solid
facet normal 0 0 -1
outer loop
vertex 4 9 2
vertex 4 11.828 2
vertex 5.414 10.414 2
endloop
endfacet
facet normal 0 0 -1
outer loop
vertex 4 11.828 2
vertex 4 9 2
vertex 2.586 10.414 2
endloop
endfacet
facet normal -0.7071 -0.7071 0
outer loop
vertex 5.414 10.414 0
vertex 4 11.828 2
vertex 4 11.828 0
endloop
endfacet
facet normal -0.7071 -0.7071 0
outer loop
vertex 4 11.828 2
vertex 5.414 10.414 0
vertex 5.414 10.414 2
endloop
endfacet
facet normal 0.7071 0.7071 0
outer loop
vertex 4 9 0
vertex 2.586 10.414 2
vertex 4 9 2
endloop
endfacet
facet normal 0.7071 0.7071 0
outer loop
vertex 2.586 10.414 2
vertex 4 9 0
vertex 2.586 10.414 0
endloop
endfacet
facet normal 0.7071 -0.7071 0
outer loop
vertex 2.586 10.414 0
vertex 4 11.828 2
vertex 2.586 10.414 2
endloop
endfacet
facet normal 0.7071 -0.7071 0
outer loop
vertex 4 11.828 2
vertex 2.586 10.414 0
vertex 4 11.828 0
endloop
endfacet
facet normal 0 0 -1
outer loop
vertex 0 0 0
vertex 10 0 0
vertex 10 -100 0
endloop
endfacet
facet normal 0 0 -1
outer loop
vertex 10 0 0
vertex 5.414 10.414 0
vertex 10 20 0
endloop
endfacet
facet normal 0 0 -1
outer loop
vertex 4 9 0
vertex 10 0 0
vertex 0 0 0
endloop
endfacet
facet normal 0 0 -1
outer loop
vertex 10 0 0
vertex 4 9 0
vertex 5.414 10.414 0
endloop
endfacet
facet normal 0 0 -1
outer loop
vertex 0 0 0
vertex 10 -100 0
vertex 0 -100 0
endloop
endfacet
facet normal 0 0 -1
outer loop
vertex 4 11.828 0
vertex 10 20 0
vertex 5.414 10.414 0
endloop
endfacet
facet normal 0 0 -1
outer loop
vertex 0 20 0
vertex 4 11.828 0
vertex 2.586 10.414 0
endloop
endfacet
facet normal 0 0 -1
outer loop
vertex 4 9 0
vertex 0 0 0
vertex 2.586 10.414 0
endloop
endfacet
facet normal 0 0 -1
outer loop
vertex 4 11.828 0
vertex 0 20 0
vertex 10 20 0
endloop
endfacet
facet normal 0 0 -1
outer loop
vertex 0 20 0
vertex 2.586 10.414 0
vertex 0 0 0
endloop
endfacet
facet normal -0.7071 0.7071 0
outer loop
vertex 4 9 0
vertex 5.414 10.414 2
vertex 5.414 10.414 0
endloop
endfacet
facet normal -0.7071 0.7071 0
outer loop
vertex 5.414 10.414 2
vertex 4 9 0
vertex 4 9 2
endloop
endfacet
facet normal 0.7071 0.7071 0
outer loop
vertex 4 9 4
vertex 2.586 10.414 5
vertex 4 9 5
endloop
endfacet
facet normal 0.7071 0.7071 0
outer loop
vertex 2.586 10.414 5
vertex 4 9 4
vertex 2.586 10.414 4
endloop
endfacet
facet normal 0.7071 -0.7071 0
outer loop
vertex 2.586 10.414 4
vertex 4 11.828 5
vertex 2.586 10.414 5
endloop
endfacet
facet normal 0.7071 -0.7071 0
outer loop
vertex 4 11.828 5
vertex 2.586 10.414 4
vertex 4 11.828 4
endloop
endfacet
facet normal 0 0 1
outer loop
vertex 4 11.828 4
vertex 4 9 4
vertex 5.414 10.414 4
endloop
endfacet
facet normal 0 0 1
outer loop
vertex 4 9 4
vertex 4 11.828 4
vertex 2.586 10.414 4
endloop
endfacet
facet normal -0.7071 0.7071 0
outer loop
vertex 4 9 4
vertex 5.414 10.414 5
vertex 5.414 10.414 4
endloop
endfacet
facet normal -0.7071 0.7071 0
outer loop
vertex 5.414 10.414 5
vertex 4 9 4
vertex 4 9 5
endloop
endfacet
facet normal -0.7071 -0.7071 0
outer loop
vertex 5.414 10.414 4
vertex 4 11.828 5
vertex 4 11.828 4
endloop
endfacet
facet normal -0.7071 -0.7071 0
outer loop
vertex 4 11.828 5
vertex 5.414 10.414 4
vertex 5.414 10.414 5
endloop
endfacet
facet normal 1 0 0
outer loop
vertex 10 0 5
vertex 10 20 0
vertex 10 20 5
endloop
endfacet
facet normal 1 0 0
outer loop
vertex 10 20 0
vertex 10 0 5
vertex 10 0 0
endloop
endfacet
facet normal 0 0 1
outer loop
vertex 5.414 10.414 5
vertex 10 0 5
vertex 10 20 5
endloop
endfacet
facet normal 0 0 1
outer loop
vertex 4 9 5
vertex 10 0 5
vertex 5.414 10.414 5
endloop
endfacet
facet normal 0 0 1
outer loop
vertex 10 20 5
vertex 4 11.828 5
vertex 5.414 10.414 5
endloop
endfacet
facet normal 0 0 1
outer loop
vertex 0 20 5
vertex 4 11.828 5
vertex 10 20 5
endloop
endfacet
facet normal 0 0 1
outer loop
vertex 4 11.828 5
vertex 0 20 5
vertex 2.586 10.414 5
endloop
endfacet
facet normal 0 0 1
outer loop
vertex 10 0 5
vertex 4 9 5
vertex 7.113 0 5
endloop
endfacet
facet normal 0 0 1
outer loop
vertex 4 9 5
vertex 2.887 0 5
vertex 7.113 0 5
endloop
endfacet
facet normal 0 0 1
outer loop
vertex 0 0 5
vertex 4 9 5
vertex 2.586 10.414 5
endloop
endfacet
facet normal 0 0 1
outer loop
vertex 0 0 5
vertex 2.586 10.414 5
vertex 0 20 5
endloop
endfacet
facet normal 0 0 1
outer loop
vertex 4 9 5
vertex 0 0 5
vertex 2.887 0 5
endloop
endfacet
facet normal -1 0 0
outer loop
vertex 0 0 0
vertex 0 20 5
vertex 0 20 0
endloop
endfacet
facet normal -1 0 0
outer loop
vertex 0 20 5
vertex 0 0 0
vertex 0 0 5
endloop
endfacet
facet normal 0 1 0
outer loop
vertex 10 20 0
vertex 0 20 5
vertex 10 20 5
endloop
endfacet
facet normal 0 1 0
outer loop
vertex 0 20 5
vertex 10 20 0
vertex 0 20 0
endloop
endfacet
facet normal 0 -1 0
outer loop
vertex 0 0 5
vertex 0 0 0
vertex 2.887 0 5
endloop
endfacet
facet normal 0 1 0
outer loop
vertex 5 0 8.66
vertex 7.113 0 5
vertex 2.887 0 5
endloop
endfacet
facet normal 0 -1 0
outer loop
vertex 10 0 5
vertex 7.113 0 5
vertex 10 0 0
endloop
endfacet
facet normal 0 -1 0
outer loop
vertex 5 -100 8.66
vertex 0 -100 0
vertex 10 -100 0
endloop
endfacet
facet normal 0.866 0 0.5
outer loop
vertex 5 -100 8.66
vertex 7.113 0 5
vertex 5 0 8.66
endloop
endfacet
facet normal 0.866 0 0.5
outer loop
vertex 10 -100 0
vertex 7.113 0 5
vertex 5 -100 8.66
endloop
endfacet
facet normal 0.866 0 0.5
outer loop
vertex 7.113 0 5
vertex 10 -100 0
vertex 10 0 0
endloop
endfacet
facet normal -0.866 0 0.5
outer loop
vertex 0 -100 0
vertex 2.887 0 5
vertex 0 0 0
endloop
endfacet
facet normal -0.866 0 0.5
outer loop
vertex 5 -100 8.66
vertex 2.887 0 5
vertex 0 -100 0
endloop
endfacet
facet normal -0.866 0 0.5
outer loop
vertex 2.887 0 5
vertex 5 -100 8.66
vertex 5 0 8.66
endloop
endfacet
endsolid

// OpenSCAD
box_width = 100;
box_length = 200;
box_height = 50;


module centered_box(width, length, height) {
  translate([-width/2, -length/2, 0])
  cube([width, length, height]);
}

// Example usage:
//centered_box(box_width, box_length, box_height);

module flat_extruded_triangle(size, height) {
  rotate([90, 0, 0]) // Rotate 90 degrees around the X-axis
    linear_extrude(height = height)
      triangle(size);
}

module triangle(size) {
  polygon(points=[[0, 0], [size, 0], [size / 2, size * sqrt(3) / 2]]);
}

// Example usage:
flat_extruded_triangle(10, 100);


module beveled_box(width, length, height, bevel_size) {
  difference() {
    cube([width, length, height]);
    for (i = [-1, 1]) {
      for (j = [-1, 1]) {
        for (k = [0,1]){
          translate([i * (width/2 - bevel_size), j * (length/2 - bevel_size), k*(height-bevel_size)])
          rotate([0, 0, atan(bevel_size / bevel_size)])
          cube([bevel_size * 2, bevel_size * 2, bevel_size * 2]);
        }
      }
    }
  }
}

// Example usage:
beveled_box(10, 20, 5, 1);
